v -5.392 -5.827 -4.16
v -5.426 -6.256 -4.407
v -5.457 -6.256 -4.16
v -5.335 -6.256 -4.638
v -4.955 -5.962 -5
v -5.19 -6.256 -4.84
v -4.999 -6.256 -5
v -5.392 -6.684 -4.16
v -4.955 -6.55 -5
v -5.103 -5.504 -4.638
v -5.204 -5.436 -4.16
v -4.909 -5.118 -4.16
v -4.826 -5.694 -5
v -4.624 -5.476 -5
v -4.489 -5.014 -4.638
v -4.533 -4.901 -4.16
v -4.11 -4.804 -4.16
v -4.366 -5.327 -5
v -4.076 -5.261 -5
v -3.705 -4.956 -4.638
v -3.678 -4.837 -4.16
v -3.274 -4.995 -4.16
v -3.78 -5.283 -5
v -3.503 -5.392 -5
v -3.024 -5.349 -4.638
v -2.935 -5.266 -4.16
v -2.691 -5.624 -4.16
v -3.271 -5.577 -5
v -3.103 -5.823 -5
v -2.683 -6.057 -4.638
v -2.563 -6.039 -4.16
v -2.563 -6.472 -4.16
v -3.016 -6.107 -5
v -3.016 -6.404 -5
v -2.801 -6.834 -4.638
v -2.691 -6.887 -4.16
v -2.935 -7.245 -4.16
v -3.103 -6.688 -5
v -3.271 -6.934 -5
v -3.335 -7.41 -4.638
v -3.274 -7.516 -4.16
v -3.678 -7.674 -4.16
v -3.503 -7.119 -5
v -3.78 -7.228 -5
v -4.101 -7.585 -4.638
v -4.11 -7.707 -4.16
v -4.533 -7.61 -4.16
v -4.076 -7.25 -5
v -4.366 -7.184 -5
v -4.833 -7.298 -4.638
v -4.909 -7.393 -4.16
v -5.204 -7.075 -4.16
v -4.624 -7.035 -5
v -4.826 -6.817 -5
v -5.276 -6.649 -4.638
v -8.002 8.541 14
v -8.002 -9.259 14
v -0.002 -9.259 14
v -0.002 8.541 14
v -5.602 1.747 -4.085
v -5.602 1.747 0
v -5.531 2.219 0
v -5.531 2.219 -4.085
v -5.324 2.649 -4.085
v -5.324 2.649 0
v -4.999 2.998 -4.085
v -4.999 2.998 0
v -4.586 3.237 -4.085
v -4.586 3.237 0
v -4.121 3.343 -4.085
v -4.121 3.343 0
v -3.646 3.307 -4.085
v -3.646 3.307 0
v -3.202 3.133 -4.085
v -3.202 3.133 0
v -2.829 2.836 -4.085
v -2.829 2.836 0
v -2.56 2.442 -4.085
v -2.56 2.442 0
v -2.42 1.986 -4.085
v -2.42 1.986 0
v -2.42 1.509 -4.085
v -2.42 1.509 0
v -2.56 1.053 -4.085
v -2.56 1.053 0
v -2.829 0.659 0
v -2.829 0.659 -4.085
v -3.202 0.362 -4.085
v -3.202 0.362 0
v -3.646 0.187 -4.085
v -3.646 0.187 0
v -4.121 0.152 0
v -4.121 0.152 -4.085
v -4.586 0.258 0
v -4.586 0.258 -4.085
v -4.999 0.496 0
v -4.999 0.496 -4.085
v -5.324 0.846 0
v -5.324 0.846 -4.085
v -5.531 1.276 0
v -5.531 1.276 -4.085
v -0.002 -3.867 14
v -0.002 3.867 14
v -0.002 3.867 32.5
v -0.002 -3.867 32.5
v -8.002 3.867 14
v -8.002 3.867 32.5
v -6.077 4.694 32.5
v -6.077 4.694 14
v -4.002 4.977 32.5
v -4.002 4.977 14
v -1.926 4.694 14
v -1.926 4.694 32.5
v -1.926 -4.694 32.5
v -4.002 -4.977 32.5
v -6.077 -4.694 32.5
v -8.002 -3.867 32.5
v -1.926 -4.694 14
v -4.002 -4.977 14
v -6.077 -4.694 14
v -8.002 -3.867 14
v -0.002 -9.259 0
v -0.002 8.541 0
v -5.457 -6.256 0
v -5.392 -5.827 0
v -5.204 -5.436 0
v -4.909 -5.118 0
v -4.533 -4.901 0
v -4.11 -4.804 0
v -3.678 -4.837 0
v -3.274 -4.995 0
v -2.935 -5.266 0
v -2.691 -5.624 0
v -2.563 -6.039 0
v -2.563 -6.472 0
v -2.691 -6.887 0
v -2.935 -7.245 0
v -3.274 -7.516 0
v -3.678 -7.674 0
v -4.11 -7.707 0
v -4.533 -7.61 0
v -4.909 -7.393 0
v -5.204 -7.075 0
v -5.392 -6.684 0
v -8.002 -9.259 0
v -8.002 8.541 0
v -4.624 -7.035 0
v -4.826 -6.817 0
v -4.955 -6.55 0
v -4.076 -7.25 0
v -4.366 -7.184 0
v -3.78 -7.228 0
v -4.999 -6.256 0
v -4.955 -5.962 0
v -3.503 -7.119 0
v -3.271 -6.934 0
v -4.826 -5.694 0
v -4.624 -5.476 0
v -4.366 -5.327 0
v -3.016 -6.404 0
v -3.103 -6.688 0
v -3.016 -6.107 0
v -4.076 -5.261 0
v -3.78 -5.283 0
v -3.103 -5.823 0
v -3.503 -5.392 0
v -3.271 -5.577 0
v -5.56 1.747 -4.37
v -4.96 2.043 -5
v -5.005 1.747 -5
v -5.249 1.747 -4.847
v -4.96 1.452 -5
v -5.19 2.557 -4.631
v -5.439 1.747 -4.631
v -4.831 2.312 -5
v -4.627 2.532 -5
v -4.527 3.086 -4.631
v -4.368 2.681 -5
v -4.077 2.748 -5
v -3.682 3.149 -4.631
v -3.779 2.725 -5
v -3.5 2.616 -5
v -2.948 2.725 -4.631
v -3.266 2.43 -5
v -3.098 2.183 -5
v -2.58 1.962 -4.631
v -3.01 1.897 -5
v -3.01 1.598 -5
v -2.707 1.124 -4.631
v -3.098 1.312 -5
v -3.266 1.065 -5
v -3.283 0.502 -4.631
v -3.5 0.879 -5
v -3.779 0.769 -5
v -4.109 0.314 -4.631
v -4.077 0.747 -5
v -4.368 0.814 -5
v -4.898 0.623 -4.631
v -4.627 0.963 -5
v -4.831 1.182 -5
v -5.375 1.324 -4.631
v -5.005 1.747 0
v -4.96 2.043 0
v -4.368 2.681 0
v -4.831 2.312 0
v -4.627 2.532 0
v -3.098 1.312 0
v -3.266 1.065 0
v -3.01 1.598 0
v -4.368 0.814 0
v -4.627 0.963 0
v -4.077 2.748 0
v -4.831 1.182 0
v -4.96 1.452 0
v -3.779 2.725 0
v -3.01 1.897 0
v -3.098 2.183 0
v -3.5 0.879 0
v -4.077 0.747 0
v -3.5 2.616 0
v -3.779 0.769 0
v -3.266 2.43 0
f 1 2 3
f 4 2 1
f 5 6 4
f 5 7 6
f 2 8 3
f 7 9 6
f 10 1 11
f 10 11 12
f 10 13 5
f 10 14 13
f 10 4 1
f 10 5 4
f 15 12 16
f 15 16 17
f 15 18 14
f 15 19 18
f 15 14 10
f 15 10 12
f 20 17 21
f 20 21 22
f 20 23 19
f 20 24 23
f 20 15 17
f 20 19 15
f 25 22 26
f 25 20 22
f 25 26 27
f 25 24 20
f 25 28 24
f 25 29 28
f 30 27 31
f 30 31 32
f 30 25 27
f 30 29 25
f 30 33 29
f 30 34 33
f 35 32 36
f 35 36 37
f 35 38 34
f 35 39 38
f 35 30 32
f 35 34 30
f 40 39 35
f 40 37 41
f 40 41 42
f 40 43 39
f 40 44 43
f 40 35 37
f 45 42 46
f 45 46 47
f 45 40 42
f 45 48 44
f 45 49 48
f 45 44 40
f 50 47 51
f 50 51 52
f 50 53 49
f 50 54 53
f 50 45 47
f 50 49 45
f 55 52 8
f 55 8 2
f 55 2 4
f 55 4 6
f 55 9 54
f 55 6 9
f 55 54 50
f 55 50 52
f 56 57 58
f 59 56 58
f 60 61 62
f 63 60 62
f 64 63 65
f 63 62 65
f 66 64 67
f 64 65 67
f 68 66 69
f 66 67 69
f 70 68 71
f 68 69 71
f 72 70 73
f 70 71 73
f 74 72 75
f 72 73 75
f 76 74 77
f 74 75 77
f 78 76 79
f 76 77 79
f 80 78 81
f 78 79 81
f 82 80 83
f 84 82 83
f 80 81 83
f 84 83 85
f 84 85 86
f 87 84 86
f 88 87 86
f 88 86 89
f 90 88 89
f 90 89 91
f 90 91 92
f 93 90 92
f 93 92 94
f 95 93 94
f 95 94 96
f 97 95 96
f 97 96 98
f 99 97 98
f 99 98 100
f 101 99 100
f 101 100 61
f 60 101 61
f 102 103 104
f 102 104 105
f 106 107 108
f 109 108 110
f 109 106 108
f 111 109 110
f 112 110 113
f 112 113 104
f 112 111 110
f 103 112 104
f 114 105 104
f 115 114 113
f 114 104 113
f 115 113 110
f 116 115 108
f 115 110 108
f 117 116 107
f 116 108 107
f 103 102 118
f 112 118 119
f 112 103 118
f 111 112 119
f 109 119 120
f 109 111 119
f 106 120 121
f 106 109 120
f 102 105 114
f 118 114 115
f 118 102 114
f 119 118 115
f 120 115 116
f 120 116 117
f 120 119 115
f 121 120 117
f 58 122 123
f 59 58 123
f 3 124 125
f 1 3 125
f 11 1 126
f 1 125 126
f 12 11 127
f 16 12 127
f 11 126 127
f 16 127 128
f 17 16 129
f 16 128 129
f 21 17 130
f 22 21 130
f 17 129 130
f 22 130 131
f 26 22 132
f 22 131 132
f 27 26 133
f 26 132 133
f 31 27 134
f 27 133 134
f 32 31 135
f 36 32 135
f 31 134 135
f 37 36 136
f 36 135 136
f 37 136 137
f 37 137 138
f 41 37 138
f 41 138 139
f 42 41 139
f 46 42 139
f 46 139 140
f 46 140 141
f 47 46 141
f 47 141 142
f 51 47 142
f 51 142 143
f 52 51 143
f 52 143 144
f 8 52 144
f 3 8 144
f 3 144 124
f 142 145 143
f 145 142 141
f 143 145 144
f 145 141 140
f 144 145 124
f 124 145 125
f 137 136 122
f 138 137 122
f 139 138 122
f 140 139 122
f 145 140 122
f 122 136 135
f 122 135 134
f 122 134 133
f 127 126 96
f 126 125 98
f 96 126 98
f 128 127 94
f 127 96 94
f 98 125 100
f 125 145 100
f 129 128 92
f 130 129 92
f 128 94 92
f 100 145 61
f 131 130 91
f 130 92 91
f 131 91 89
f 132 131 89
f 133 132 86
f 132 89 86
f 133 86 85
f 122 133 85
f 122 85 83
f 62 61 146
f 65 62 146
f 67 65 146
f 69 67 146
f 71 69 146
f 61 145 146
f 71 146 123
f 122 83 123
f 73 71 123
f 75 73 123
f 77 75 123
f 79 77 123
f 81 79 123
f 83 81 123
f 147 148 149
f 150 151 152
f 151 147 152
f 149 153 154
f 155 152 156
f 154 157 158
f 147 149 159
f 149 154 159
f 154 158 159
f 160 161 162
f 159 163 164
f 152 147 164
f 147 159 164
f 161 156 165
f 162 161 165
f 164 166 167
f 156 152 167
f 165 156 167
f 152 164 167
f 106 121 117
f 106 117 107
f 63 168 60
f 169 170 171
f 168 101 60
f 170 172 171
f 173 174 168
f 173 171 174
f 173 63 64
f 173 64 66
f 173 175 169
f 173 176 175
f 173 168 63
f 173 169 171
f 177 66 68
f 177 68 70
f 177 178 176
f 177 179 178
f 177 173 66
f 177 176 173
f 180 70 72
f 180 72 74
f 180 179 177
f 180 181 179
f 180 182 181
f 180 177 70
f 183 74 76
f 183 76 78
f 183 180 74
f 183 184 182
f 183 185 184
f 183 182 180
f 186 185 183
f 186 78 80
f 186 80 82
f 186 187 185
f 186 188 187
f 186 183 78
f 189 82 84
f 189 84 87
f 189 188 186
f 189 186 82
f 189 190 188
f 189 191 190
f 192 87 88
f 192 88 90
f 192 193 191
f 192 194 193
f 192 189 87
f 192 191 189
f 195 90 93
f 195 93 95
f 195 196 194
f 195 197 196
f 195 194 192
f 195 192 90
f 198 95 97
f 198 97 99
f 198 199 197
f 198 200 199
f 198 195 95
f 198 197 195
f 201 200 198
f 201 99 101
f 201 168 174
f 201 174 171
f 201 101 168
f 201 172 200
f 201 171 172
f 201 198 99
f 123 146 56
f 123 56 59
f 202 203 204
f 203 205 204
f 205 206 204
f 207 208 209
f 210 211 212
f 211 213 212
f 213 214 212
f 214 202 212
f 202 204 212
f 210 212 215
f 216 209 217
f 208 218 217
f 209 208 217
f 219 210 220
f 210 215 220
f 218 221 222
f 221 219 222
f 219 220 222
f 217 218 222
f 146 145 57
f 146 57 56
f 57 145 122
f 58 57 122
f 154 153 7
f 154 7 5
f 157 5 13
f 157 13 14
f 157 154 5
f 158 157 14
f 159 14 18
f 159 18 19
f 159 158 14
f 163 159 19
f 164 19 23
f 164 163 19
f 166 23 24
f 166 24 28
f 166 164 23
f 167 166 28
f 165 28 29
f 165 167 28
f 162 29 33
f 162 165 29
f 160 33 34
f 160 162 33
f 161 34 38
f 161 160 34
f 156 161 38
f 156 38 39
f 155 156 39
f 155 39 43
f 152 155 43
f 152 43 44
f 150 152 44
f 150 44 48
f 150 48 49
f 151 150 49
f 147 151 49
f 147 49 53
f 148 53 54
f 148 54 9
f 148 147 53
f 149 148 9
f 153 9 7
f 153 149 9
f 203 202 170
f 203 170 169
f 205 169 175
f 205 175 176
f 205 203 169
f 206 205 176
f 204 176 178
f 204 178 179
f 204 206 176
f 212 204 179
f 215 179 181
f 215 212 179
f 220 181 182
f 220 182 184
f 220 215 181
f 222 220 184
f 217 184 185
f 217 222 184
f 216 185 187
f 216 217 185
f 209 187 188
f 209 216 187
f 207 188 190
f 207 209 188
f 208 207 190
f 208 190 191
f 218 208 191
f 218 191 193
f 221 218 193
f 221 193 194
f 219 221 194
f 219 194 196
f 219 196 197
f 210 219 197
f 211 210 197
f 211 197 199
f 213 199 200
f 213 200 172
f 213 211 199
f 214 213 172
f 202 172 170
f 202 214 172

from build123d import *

# Parameters (mm, degrees)
SKETCH1_W           = 8
SKETCH1_H           = 17.8
BOSS_EXTRUDE1_DEPTH = 14
BOSS_EXTRUDE2_DEPTH = 18.5
SKETCH3_R           = 1.455112434
SKETCH3_R_2         = 0.997349366
SKETCH3_R_3         = 1.6
SKETCH3_R_4         = 1.003096482
BOSS_EXTRUDE3_DEPTH = 5
FILLET1_R           = 1


with BuildPart() as part:
    # Sketch1 → Boss-Extrude1 (new body)
    with BuildSketch(Plane.XY):
        with Locations((-4.001754105, -0.359172607)):
            Rectangle(SKETCH1_W, SKETCH1_H)
    extrude(amount=BOSS_EXTRUDE1_DEPTH)

    # Sketch3 → Boss-Extrude3 (add)
    # profile 1 of 2: a face of its own
    with BuildSketch(Plane(origin=(0, 0, 0), x_dir=(-1, 0, 0), z_dir=(0, 0, -1))):
        with Locations((4.001754105, -6.25552787)):
            Circle(SKETCH3_R)
        with Locations((4.001754105, -6.25552787)):
            Circle(SKETCH3_R_2, mode=Mode.SUBTRACT)
    # profile 2 of 2: a face of its own
    with BuildSketch(Plane(origin=(0, 0, 0), x_dir=(-1, 0, 0), z_dir=(0, 0, -1))):
        with Locations((4.001754105, 1.747298107)):
            Circle(SKETCH3_R_3)
        with Locations((4.001754105, 1.747298107)):
            Circle(SKETCH3_R_4, mode=Mode.SUBTRACT)
    extrude(amount=BOSS_EXTRUDE3_DEPTH)

    # Fillet1
    # the kernel refuses this fillet: 1 mm, written as the material it takes off along each edge
    with BuildSketch(Plane(origin=(-4.001754105, -6.25552787, -5), x_dir=(-1, 0, 0), z_dir=(0, -1, 0))) as fillet1_piece_1:
        with BuildLine():
            CenterArc((0.455112434, -0.84022563), FILLET1_R, 0, 57.163953249)
            Line((0.997349366, 0), (1.008194105, 0.016804513))
            ThreePointArc((1.008194105, 0.016804513), (1.2262309, 0.02), (1.455112434, 0.02))
            Line((1.455112434, 0.02), (1.475112434, 0))
            Line((1.475112434, 0), (1.475112434, -0.84022563))
            Line((1.475112434, -0.84022563), (1.455112434, -0.84022563))
        make_face()
    revolve(axis=Axis((-4.001754105, -6.25552787, -5), (0, 0, -1)), mode=Mode.SUBTRACT)
    with BuildSketch(Plane(origin=(-4.001754105, 1.747298107, -5), x_dir=(-1, 0, 0), z_dir=(0, -1, 0))) as fillet1_piece_2:
        with BuildLine():
            CenterArc((0.6, -0.915157487), FILLET1_R, 0, 66.22810219)
            Line((1.003096482, 0), (1.011158412, 0.01830315))
            ThreePointArc((1.011158412, 0.01830315), (1.301548241, 0.02), (1.6, 0.02))
            Line((1.6, 0.02), (1.62, 0))
            Line((1.62, 0), (1.62, -0.915157487))
            Line((1.62, -0.915157487), (1.6, -0.915157487))
        make_face()
    revolve(axis=Axis((-4.001754105, 1.747298107, -5), (0, 0, -1)), mode=Mode.SUBTRACT)


with BuildPart() as body_2:
    # Sketch2 → Boss-Extrude2 (new body)
    with BuildSketch(Plane.XY.offset(14)):
        with BuildLine():
            Line((-8.001754105, -3.867150267), (-8.001754105, 3.867150267))
            ThreePointArc((-8.001754105, 3.867150267), (-4.001754105, 4.977137227), (-0.001754105, 3.867150267))
            Line((-0.001754105, 3.867150267), (-0.001754105, -3.867150267))
            ThreePointArc((-0.001754105, -3.867150267), (-4.001754105, -4.977137227), (-8.001754105, -3.867150267))
        make_face()
    extrude(amount=BOSS_EXTRUDE2_DEPTH)


solid = Compound([part.part, body_2.part])
